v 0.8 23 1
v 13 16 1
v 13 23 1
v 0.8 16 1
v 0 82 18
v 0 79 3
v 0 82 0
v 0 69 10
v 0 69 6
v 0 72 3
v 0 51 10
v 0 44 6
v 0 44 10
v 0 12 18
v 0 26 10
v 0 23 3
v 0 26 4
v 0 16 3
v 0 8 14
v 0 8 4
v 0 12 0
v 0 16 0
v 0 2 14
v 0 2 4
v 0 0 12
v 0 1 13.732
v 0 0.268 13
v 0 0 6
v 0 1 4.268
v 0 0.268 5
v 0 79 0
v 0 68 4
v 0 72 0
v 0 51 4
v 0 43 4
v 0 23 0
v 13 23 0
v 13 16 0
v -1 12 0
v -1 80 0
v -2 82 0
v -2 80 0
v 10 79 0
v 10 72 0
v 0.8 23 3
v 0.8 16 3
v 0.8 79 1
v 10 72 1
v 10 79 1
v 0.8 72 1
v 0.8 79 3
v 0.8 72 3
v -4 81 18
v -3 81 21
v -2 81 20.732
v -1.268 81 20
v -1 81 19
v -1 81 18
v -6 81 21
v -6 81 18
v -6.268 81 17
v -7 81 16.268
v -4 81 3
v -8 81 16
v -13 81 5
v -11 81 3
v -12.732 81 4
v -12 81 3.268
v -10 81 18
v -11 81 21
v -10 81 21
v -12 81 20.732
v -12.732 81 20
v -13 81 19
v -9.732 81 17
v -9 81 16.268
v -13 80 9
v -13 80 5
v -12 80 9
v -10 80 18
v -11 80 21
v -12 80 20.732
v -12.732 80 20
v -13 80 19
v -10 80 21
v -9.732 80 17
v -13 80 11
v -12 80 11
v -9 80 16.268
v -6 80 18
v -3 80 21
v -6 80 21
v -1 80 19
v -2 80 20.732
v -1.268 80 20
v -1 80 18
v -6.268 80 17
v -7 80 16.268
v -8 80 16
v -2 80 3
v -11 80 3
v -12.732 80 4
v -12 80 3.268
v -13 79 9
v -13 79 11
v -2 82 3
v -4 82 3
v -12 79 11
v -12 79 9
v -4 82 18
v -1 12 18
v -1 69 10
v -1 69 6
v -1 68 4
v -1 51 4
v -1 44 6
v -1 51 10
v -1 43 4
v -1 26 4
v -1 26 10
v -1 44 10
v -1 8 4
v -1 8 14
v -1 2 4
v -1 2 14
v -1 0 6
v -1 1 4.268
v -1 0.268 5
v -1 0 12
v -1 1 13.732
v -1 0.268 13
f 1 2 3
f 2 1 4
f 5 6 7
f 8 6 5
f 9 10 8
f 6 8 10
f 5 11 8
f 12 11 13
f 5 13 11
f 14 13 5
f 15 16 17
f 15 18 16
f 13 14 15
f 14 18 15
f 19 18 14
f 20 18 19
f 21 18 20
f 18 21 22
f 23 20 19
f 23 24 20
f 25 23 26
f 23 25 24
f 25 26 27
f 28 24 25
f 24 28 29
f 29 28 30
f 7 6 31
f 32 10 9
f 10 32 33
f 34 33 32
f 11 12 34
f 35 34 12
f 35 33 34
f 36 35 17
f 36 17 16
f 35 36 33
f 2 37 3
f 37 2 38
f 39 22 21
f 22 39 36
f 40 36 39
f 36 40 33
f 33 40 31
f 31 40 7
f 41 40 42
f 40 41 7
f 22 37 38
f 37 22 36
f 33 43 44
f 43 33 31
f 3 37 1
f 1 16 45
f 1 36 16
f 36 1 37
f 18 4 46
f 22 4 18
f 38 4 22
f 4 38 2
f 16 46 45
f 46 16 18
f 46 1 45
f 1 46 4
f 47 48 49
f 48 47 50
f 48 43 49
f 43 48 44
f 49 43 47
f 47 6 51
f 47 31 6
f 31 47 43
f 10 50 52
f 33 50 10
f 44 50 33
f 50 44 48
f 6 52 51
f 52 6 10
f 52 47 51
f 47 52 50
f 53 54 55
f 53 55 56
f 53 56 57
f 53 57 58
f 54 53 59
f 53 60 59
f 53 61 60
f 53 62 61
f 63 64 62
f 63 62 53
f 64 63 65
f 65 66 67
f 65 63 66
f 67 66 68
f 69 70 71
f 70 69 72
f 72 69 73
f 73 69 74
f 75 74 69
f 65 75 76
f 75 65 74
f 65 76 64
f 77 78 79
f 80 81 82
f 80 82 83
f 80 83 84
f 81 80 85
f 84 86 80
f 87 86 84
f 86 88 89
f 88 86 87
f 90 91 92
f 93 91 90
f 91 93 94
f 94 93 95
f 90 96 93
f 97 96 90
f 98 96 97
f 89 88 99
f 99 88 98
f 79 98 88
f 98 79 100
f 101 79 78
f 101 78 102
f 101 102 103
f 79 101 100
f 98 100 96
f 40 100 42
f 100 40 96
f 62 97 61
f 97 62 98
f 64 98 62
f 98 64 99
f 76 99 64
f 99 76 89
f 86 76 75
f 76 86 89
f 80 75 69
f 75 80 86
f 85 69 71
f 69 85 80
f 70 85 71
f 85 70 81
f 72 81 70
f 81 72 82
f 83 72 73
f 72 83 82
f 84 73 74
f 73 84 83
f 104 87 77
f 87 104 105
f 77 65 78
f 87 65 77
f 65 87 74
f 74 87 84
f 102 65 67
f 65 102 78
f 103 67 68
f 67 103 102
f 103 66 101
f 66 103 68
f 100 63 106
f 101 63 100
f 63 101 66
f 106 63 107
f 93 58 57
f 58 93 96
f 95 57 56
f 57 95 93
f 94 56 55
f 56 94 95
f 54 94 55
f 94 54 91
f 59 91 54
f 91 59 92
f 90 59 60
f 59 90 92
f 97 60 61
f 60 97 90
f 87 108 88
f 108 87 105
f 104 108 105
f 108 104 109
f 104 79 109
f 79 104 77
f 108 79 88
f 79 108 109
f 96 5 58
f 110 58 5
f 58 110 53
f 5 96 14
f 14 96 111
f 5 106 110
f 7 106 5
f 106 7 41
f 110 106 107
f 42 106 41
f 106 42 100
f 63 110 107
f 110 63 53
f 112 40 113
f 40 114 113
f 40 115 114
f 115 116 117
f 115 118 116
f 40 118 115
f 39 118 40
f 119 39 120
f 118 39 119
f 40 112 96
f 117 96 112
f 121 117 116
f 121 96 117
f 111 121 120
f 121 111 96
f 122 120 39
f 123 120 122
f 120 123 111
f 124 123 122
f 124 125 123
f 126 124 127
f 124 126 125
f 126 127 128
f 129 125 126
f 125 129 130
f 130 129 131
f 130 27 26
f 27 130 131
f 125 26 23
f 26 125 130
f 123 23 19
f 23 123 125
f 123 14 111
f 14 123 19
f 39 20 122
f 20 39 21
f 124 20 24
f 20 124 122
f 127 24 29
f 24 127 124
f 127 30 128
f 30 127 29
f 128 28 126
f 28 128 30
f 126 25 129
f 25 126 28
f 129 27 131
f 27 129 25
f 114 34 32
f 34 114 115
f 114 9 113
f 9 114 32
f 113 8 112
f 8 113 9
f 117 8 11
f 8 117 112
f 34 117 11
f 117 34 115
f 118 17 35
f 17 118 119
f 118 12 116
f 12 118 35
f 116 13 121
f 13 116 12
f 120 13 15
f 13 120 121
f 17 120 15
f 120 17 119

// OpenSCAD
DP1 = 11;
DP2 = 36;

DP_WIDTH = 6;
DP_HEIGHT = 18;
DP_KW = 2;
DP_KH = 1;


module DP(w,h,kw,kh) {
	dp_p = [[0,0],[w,0],[w,h],[kw,h],[0,h-kh]];
	dp = [[0,1,2,3,4]];
	polygon(dp_p, dp);
}

module Top() {
	difference() {
		union() {
			translate([2,2])
				square([14,8]);

			square([16,2]);
			square([2,10]);
			
			translate([2,10])
				square([14,2]);
			
			translate([2,10])
				circle(r=2, $fn=12);
			
			translate([16,2]){
				circle(r=2, $fn=12);
				square([2,3]);
			}
			
			translate([16,10])
				circle(r=2, $fn=12);
			
			translate([16,8])
				square([2,2]);

		}

		translate([15,5])
		union() {
			square([3,4]);
			
			translate([0,2])
				circle(d=4, $fn=12);

		}
	}
}

bracket_form_p = [[6,0],[12,0],[14,2],[14,8],[18,12],[18,80],[0,80],[0,12],[4,8],[4,2]];
bracket_form = [[0,1,2,3,4,5,6,7,8,9]];

rotate([0,-90,0])
union() {
	
	difference() {
		linear_extrude(height=1){
			difference() {
				polygon(bracket_form_p, bracket_form);
			
				translate([4,80-DP1-DP_HEIGHT]) DP(DP_WIDTH, DP_HEIGHT, DP_KW, DP_KH);
				translate([4,80-DP2-DP_HEIGHT]) DP(DP_WIDTH, DP_HEIGHT, DP_KW, DP_KH);
			}
			
			translate([6,2])
				circle(r=2, $fn=12);
			
			translate([12,2])
				circle(r=2, $fn=12);
		}
	}

	// Flügel 1
	translate([0,16,-13]){
		cube([1,7,13]);
		translate([0,0,12.2])
			cube([3,7,.8]);
	}

	// Flügel 2
	translate([0,72,-10]){
		cube([1,7,10]);
		translate([0,0,9.2])
			cube([3,7,.8]);
	}

	translate([3,81,0])
	rotate([90,0,0])
	union () {
		translate([0,1,0])
			linear_extrude(height=1){
				Top();
			}
							
		translate([6,12,0])
			cube([2,1,2]);
		
		translate([-3,0,-1])
			cube([18,2,2]);
			
		translate([0,1,-1])
			cube([15,3,2]);
	}
}
